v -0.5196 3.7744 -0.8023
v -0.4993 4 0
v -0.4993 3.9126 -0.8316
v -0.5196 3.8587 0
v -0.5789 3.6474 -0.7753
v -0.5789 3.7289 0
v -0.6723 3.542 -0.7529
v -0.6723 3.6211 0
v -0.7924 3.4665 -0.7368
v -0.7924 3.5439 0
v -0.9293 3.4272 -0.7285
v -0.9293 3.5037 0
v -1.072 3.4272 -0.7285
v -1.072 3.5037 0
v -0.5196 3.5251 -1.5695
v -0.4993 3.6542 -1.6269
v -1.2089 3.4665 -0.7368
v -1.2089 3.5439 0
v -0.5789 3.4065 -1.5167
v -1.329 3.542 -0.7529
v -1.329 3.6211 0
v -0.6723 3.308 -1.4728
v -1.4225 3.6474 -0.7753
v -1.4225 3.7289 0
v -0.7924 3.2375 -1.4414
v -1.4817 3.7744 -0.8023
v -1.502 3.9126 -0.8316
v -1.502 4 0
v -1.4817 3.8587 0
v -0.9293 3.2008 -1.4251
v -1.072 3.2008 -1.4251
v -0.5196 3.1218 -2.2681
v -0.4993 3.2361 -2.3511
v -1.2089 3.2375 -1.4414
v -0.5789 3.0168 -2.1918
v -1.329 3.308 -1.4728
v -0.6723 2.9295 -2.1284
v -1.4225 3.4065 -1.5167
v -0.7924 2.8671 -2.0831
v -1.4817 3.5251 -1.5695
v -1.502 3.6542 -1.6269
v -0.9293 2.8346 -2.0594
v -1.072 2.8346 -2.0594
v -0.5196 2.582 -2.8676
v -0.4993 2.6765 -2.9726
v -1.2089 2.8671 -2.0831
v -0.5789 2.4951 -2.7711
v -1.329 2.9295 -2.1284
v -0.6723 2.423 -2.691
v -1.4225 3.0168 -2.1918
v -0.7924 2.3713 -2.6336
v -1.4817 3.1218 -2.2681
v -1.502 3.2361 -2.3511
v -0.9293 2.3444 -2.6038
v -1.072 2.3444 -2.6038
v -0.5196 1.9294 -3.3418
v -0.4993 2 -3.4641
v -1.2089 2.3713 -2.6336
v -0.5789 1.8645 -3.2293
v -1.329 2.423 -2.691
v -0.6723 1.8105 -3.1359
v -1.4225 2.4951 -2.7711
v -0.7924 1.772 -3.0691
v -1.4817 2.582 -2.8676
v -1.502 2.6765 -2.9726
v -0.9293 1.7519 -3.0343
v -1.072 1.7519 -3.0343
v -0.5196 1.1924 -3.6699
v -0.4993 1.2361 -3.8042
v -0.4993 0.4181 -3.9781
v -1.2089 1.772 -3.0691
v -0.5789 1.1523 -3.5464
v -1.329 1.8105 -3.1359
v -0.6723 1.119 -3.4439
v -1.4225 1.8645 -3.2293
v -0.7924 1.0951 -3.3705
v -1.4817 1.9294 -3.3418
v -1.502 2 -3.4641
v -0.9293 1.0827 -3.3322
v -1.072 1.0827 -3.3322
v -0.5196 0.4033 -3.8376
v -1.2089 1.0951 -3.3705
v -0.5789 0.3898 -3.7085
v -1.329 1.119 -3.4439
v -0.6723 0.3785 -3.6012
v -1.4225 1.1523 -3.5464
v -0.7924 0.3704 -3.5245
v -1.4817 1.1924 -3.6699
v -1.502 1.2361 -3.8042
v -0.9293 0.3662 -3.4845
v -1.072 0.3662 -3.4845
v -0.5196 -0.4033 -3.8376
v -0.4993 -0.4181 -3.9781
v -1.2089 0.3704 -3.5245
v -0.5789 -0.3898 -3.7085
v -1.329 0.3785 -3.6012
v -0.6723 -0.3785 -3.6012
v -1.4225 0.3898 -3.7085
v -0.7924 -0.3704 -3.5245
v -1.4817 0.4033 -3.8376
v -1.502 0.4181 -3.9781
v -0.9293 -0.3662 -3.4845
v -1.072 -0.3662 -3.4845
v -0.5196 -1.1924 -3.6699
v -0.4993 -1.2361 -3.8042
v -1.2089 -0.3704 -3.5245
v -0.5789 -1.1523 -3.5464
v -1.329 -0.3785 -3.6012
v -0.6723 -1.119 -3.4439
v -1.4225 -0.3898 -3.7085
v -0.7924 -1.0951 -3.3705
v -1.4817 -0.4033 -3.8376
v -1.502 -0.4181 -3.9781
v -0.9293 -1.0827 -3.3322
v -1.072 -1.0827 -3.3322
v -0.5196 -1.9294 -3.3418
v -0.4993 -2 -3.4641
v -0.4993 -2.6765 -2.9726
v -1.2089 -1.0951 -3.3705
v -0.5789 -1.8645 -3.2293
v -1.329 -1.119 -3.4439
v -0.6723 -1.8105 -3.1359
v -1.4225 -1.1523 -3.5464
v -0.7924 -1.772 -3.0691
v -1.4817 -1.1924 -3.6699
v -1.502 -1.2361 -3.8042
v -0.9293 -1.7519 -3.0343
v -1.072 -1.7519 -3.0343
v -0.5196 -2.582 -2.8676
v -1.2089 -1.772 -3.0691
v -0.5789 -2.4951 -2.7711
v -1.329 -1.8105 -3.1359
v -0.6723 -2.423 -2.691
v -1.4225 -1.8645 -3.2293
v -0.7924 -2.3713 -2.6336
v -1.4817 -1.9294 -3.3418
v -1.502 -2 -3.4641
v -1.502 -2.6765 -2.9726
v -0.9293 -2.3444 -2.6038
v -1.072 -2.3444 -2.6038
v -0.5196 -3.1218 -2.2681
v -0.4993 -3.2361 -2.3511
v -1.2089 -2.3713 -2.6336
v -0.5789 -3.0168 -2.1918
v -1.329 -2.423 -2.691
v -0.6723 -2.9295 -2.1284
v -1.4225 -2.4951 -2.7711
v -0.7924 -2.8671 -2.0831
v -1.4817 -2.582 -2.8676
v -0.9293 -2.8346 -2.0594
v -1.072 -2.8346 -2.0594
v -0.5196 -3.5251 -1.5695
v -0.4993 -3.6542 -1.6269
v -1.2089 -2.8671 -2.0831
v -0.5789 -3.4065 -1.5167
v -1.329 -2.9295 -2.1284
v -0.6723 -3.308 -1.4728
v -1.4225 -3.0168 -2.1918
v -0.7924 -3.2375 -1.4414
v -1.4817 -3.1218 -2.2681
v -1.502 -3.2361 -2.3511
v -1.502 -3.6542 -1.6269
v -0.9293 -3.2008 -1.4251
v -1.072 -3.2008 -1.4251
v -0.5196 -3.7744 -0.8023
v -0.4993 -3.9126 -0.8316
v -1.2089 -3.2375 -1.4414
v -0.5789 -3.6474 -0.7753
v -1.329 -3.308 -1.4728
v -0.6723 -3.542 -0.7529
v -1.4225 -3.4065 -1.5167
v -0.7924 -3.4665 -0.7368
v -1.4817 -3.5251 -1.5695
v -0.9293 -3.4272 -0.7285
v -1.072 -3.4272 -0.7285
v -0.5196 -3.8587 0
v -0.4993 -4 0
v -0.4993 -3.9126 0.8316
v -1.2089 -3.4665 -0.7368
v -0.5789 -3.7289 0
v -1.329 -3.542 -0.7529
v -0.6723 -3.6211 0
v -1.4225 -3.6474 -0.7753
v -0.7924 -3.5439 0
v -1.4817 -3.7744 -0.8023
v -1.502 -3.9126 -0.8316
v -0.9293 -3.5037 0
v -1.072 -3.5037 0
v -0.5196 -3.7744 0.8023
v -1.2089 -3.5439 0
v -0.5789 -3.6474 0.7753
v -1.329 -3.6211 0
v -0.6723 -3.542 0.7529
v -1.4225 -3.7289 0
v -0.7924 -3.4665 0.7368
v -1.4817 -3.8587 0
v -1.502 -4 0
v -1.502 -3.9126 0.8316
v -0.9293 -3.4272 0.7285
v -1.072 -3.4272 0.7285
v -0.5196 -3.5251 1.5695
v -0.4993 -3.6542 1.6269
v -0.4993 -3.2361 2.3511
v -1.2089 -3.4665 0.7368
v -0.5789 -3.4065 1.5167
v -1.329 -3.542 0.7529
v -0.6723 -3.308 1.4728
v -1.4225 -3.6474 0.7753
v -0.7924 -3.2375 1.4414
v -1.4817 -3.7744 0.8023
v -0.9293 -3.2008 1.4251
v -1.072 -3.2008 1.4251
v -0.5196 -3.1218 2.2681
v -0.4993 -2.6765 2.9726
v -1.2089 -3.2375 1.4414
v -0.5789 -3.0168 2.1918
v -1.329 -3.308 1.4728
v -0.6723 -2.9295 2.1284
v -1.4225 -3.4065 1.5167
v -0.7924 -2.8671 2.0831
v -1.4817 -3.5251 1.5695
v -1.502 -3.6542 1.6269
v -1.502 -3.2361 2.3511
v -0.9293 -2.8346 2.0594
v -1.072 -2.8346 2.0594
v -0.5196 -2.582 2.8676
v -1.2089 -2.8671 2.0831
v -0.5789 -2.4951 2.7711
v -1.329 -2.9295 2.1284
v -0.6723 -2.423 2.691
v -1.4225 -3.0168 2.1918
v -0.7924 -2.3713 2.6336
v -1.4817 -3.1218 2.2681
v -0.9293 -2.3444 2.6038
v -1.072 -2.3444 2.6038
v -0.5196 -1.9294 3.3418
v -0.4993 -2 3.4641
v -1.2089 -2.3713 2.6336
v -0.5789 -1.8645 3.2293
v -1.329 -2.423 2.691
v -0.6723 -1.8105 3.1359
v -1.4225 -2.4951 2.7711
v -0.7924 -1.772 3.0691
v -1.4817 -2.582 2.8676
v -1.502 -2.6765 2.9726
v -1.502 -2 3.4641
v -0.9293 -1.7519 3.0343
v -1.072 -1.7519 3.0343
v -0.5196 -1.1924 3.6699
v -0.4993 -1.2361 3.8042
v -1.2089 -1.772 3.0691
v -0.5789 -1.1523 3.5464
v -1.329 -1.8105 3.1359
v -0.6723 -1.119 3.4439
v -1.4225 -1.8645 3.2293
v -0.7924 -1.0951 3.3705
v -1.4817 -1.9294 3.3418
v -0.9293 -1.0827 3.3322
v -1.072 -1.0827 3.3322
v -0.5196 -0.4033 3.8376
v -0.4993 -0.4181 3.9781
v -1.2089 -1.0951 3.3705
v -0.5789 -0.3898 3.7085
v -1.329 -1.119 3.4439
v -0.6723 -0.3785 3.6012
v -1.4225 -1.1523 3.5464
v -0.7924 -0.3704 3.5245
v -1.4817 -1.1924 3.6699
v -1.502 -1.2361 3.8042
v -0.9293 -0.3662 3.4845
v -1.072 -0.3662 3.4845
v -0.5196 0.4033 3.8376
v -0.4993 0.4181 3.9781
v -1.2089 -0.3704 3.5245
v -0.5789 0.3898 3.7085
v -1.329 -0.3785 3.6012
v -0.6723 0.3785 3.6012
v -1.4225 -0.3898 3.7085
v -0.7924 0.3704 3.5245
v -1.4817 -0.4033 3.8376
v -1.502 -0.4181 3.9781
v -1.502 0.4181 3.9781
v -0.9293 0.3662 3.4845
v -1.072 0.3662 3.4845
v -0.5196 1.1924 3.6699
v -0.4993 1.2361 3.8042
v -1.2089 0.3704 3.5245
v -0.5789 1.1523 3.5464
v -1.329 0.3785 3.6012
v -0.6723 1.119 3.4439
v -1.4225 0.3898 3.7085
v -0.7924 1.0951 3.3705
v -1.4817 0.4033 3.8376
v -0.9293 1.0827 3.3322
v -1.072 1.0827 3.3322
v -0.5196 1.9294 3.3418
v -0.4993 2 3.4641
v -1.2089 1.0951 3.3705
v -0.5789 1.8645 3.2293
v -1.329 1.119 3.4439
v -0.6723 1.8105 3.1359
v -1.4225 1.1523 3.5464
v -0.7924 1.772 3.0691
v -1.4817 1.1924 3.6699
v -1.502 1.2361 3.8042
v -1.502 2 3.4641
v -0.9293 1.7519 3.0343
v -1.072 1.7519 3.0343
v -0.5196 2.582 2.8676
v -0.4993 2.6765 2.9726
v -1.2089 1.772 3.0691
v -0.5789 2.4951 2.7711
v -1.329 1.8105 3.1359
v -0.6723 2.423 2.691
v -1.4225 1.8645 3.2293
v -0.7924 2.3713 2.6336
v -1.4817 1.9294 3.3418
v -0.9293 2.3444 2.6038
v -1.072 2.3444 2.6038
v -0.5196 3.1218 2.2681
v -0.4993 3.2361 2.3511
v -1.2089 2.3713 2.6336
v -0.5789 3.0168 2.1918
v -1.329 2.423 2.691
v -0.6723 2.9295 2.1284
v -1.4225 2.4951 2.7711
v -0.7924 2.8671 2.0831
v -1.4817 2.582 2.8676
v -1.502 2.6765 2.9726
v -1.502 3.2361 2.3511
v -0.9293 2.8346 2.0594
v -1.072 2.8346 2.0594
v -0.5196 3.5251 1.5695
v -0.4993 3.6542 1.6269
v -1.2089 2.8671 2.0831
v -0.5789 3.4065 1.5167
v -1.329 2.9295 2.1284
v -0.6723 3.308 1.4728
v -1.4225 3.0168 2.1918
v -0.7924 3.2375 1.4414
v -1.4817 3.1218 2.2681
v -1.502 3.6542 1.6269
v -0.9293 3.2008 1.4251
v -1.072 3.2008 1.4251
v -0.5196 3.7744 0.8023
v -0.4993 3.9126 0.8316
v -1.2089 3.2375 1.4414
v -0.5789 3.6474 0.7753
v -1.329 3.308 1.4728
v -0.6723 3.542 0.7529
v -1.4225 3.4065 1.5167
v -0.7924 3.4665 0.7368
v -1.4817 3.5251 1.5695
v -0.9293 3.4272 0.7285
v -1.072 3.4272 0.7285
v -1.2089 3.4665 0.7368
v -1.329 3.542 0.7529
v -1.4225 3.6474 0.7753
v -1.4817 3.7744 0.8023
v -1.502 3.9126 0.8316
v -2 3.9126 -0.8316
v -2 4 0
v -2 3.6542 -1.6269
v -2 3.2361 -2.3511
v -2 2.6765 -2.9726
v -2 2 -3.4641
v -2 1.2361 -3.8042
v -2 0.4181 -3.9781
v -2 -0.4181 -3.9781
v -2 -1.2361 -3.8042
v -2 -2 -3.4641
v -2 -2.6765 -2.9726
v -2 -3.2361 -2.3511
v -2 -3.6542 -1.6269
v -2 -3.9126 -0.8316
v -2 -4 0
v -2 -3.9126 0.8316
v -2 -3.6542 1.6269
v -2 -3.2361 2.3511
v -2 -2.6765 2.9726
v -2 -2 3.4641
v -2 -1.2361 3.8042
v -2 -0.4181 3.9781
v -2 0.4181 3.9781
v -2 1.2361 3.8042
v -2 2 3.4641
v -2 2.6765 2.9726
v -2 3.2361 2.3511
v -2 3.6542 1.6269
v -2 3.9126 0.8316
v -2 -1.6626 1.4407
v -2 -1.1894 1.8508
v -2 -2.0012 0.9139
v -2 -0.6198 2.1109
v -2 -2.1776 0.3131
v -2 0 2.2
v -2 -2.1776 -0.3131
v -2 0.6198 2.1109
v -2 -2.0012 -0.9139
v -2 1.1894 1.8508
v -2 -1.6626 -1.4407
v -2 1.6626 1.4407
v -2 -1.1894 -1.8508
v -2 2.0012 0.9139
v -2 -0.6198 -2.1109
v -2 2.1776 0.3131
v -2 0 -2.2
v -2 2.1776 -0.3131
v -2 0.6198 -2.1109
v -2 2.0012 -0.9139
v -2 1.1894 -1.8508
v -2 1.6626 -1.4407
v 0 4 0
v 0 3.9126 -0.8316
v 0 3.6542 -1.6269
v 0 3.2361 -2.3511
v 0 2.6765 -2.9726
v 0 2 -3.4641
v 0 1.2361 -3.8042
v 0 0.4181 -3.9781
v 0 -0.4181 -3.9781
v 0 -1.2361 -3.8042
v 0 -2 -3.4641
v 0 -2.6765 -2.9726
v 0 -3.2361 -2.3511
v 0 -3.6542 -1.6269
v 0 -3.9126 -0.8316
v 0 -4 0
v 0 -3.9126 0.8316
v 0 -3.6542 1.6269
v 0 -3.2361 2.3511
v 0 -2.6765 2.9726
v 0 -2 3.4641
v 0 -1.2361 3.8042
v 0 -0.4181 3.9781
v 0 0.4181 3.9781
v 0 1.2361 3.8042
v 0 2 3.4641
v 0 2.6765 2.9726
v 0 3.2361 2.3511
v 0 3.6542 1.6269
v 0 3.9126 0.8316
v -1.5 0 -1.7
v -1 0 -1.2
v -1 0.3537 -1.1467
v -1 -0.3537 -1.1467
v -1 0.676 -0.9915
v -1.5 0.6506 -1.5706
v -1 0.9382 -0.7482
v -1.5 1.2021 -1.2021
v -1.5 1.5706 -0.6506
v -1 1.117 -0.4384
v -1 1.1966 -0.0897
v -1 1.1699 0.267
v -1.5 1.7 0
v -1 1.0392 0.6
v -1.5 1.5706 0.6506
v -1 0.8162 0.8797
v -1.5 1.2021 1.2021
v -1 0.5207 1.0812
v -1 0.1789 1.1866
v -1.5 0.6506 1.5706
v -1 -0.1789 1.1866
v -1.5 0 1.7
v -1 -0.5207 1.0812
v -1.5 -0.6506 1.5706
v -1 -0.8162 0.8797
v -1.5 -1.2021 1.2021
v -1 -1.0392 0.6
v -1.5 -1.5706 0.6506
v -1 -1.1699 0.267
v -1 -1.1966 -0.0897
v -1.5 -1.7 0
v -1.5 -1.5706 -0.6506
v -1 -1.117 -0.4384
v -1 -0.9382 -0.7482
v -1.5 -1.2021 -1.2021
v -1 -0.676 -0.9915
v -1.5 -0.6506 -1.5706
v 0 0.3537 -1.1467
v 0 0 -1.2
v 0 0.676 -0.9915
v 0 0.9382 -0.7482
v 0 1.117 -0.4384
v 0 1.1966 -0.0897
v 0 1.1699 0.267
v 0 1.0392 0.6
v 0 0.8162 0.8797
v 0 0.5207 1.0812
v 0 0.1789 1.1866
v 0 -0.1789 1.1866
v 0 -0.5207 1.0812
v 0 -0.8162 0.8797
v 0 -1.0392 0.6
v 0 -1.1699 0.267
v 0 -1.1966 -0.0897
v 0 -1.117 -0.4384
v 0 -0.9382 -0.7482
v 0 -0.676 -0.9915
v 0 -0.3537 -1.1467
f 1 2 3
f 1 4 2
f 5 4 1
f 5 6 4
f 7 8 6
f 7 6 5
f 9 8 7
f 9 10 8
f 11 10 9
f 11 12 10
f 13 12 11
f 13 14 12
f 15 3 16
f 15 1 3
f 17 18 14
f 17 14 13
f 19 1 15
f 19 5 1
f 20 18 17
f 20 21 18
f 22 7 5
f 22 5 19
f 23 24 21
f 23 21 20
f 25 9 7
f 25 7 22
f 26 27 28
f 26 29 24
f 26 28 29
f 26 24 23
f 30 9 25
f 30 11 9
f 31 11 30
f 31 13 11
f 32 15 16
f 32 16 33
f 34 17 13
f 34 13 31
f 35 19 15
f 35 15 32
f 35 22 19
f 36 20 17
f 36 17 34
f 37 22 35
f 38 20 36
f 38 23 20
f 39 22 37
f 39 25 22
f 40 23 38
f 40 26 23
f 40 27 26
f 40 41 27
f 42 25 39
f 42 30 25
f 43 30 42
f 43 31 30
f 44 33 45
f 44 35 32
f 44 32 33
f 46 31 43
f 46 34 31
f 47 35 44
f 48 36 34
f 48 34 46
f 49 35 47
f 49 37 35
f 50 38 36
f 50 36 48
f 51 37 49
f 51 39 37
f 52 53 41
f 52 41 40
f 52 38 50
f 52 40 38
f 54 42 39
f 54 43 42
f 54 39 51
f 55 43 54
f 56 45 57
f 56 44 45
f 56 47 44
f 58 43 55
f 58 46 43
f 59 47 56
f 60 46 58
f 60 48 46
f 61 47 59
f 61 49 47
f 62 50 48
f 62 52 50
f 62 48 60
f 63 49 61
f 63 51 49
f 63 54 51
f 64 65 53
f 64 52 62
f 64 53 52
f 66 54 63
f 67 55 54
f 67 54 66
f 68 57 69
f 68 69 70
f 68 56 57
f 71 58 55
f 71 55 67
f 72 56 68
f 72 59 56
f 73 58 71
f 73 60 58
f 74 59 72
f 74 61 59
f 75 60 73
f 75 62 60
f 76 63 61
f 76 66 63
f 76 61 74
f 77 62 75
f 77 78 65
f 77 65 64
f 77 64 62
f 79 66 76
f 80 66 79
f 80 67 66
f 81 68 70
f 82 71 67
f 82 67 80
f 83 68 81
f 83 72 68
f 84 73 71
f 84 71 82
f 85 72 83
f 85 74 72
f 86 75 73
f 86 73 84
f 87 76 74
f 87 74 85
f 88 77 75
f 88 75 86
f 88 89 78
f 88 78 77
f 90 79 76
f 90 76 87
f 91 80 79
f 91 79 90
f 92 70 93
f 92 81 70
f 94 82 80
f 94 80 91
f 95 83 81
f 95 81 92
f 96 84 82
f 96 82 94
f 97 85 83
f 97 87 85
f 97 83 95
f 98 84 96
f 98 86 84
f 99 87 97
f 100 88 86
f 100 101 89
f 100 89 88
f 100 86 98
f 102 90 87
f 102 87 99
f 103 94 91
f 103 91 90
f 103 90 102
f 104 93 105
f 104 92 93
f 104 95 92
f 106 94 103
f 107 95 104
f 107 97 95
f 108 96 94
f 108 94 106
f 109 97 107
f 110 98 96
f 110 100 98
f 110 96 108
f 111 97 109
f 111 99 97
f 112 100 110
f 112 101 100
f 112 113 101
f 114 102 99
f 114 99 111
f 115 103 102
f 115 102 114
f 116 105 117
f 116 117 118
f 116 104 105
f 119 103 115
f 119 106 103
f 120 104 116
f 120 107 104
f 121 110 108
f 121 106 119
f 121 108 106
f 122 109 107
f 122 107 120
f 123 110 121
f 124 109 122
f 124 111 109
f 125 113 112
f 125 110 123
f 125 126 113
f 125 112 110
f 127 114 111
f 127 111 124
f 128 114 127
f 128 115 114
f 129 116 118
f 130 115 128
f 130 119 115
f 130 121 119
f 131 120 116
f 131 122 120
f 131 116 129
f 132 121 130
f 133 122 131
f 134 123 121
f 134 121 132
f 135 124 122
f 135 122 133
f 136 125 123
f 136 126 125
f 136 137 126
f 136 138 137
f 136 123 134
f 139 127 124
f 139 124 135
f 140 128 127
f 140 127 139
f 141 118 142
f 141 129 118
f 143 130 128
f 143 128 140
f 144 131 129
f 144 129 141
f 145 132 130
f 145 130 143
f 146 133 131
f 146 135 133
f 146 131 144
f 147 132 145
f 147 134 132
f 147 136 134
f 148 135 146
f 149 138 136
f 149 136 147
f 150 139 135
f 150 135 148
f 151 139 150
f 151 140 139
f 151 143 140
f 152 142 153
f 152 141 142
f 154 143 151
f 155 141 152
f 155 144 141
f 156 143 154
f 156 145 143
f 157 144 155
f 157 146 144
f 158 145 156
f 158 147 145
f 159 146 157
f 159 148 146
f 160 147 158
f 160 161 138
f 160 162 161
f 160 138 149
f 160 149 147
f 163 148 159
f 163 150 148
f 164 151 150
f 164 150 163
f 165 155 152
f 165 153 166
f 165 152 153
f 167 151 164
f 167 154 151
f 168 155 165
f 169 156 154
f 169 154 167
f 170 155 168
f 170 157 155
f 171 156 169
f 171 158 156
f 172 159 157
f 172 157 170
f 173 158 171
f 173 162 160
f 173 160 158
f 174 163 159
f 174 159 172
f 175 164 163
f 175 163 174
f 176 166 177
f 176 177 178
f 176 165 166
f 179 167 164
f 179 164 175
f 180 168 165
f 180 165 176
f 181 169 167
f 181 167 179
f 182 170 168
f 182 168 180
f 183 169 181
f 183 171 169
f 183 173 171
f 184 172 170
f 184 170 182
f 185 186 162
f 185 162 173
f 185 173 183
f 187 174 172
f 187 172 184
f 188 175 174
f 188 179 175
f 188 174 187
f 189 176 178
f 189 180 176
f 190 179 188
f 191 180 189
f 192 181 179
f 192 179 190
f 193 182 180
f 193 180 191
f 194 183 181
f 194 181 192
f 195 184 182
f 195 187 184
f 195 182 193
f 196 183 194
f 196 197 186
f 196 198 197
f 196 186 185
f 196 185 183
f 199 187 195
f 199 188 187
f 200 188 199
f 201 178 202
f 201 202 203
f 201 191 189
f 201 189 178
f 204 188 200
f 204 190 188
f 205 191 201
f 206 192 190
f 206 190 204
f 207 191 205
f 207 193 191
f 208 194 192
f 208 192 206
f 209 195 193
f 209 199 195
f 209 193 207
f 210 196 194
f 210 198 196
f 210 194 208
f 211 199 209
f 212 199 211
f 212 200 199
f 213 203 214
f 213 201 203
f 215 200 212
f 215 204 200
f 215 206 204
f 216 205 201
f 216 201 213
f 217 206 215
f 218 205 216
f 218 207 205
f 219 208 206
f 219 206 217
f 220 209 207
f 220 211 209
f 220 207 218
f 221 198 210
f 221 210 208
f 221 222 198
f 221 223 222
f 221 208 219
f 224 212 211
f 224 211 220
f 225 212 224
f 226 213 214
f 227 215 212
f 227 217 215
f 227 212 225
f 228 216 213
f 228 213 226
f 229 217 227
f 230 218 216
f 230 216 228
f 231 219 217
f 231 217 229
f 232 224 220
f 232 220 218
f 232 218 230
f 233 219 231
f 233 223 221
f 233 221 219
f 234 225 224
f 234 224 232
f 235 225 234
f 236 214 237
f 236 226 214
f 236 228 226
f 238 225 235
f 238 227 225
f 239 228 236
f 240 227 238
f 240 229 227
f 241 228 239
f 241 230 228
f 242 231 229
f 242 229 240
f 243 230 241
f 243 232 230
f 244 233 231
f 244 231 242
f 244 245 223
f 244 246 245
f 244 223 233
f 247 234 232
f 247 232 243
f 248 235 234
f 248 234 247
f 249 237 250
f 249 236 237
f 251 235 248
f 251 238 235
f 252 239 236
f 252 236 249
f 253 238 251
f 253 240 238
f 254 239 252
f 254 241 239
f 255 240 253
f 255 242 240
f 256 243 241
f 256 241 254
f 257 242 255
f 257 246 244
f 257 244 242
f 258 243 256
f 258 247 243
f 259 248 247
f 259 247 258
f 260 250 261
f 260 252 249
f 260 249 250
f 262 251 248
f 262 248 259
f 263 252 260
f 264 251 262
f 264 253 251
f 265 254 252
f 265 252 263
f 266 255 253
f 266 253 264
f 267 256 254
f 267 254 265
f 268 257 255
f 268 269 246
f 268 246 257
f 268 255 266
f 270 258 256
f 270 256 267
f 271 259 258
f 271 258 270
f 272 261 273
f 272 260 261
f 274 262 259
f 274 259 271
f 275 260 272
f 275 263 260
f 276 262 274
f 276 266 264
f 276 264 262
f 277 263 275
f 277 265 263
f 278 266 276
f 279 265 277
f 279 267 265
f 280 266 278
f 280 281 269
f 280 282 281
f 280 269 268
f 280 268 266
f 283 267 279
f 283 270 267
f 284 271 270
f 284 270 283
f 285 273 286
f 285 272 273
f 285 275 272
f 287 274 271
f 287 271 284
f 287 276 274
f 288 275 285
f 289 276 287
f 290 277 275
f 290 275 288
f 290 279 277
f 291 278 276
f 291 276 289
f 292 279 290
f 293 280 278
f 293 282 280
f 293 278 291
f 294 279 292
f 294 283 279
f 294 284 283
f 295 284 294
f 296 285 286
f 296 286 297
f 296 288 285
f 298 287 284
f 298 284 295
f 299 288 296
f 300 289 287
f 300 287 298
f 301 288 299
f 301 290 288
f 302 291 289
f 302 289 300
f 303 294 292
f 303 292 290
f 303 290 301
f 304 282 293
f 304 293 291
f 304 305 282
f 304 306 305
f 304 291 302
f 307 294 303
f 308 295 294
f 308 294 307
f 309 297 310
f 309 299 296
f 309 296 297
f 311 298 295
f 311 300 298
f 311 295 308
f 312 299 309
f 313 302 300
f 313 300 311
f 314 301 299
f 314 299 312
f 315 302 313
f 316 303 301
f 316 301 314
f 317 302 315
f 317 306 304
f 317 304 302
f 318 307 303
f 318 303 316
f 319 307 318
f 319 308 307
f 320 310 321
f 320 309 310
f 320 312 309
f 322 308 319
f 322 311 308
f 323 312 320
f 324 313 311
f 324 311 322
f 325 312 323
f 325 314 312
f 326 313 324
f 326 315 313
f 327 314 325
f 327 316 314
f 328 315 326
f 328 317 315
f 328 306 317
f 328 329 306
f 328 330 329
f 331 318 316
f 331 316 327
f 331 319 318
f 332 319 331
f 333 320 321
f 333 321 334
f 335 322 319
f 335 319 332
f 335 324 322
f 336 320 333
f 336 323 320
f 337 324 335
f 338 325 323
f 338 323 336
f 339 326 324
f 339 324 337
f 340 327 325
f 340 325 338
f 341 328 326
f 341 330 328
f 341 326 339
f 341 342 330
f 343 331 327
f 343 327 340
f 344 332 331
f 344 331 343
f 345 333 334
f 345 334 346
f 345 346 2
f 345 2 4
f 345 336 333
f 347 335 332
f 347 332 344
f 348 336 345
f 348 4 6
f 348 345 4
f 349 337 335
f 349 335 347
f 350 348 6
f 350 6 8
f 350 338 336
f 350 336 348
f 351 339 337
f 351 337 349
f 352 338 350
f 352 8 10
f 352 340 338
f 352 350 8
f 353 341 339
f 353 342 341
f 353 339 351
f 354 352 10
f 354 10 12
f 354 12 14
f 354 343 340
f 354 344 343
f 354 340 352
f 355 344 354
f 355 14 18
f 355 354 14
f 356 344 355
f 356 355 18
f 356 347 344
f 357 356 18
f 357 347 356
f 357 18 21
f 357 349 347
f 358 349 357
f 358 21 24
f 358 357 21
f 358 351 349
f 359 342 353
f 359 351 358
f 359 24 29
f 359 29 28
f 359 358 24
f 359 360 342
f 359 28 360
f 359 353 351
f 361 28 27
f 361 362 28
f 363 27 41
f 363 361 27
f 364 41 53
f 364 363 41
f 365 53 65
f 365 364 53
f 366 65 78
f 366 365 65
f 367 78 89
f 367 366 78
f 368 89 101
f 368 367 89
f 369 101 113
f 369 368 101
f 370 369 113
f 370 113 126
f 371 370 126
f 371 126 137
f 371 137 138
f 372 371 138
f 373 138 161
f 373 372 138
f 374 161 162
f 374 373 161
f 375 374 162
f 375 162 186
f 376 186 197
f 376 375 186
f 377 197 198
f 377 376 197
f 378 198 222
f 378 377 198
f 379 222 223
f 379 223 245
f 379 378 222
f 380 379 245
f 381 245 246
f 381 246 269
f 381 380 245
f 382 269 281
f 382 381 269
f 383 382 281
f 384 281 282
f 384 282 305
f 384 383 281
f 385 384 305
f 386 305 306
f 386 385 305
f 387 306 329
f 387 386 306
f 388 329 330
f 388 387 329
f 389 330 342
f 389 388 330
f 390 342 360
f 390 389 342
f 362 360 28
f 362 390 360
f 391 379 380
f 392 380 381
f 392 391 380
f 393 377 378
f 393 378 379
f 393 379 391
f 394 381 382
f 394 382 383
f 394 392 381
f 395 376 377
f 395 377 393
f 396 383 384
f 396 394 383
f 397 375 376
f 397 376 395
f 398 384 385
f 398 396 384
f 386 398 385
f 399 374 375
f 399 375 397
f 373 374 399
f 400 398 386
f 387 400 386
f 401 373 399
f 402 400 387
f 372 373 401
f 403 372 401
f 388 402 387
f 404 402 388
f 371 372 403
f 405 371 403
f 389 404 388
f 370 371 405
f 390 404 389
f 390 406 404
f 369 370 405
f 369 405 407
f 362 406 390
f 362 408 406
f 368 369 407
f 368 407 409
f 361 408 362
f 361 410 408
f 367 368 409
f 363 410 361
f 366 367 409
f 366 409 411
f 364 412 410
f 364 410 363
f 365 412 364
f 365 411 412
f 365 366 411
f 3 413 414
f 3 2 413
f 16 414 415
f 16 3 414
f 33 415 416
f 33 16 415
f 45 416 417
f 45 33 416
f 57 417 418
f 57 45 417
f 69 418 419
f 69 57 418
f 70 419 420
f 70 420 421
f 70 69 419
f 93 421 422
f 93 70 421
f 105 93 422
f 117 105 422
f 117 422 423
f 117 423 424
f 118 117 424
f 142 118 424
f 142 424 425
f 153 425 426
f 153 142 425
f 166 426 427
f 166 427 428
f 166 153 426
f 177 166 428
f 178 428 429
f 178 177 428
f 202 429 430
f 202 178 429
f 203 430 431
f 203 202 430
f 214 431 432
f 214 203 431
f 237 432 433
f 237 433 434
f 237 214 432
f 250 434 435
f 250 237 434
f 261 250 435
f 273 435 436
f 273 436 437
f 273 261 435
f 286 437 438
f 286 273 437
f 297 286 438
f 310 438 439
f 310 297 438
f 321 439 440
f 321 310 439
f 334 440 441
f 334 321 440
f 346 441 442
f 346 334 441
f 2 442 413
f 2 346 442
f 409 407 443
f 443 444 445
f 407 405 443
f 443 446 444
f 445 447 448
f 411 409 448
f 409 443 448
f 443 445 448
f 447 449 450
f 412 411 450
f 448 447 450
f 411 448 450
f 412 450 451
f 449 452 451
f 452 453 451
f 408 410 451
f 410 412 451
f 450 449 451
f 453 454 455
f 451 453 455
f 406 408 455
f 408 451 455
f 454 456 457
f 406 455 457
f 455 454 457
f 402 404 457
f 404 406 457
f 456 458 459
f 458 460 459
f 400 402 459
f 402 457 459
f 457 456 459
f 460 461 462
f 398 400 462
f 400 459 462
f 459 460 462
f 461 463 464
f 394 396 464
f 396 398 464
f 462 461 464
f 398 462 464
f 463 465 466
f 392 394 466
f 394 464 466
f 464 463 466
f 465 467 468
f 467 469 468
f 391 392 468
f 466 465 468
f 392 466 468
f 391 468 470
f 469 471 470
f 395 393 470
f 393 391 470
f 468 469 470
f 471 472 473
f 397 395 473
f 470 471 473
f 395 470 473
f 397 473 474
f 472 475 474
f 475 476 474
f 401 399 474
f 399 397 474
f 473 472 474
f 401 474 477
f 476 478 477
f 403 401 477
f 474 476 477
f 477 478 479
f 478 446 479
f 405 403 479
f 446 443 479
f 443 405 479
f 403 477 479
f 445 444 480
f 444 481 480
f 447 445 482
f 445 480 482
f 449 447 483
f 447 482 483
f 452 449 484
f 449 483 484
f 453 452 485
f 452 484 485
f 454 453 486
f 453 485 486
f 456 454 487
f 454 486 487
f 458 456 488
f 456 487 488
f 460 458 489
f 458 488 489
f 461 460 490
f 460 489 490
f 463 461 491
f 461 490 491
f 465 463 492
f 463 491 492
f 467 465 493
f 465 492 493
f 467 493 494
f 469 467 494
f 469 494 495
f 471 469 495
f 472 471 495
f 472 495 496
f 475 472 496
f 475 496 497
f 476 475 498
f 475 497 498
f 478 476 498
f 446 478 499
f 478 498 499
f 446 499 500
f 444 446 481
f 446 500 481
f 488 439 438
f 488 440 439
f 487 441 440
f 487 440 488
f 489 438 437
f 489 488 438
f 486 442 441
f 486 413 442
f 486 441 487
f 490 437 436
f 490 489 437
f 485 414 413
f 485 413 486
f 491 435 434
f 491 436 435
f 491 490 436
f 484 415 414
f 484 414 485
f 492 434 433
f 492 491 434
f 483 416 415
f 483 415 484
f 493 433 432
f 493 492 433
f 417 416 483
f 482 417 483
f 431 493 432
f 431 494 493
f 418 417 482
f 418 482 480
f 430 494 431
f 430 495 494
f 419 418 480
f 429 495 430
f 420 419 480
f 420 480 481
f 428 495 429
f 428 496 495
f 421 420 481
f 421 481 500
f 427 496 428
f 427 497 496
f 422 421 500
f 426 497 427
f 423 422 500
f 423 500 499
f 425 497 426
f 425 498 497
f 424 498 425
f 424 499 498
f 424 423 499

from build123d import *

# Parameters (mm, degrees)
FORMSENKUNG_F_R_M2_LINSENSENKSCHRAUBE_MI_D           = 2.4
FORMSENKUNG_F_R_M2_LINSENSENKSCHRAUBE_MI_DEPTH       = 5
FORMSENKUNG_F_R_M2_LINSENSENKSCHRAUBE_MI_CSINK_D     = 4.4
FORMSENKUNG_F_R_M2_LINSENSENKSCHRAUBE_MI_CSINK_ANGLE = 90
FORMSENKUNG_F_R_M2_LINSENSENKSCHRAUBE_MI_TIP         = 0.721032743


with BuildPart() as part:
    # Skizze1 → Rotation1 (revolve)
    with BuildSketch(Plane.XY):
        with BuildLine():
            Line((0, 0), (0, 4))
            Line((0, 4), (-0.499279021, 4))
            ThreePointArc((-0.499279021, 4), (-1.000662513, 3.498616507), (-1.502046006, 4))
            Line((-1.502046006, 4), (-2, 4))
            Line((-2, 4), (-2, 0))
            Line((-2, 0), (0, 0))
        make_face()
    revolve(axis=Axis((0, 0, 0), (-1, 0, 0)))

    # Formsenkung für M2 Linsensenkschraube mit Schlitz1
    with Locations(Plane.ZY.offset(2)):
        with Locations((0, 0)):
            CounterSinkHole(FORMSENKUNG_F_R_M2_LINSENSENKSCHRAUBE_MI_D / 2, FORMSENKUNG_F_R_M2_LINSENSENKSCHRAUBE_MI_CSINK_D / 2, depth=FORMSENKUNG_F_R_M2_LINSENSENKSCHRAUBE_MI_DEPTH, counter_sink_angle=FORMSENKUNG_F_R_M2_LINSENSENKSCHRAUBE_MI_CSINK_ANGLE)
            with Locations((0, 0, -(FORMSENKUNG_F_R_M2_LINSENSENKSCHRAUBE_MI_DEPTH + FORMSENKUNG_F_R_M2_LINSENSENKSCHRAUBE_MI_TIP / 2))):  # 118° drill point
                Cone(0, FORMSENKUNG_F_R_M2_LINSENSENKSCHRAUBE_MI_D / 2, FORMSENKUNG_F_R_M2_LINSENSENKSCHRAUBE_MI_TIP, mode=Mode.SUBTRACT)


solid = part.part
